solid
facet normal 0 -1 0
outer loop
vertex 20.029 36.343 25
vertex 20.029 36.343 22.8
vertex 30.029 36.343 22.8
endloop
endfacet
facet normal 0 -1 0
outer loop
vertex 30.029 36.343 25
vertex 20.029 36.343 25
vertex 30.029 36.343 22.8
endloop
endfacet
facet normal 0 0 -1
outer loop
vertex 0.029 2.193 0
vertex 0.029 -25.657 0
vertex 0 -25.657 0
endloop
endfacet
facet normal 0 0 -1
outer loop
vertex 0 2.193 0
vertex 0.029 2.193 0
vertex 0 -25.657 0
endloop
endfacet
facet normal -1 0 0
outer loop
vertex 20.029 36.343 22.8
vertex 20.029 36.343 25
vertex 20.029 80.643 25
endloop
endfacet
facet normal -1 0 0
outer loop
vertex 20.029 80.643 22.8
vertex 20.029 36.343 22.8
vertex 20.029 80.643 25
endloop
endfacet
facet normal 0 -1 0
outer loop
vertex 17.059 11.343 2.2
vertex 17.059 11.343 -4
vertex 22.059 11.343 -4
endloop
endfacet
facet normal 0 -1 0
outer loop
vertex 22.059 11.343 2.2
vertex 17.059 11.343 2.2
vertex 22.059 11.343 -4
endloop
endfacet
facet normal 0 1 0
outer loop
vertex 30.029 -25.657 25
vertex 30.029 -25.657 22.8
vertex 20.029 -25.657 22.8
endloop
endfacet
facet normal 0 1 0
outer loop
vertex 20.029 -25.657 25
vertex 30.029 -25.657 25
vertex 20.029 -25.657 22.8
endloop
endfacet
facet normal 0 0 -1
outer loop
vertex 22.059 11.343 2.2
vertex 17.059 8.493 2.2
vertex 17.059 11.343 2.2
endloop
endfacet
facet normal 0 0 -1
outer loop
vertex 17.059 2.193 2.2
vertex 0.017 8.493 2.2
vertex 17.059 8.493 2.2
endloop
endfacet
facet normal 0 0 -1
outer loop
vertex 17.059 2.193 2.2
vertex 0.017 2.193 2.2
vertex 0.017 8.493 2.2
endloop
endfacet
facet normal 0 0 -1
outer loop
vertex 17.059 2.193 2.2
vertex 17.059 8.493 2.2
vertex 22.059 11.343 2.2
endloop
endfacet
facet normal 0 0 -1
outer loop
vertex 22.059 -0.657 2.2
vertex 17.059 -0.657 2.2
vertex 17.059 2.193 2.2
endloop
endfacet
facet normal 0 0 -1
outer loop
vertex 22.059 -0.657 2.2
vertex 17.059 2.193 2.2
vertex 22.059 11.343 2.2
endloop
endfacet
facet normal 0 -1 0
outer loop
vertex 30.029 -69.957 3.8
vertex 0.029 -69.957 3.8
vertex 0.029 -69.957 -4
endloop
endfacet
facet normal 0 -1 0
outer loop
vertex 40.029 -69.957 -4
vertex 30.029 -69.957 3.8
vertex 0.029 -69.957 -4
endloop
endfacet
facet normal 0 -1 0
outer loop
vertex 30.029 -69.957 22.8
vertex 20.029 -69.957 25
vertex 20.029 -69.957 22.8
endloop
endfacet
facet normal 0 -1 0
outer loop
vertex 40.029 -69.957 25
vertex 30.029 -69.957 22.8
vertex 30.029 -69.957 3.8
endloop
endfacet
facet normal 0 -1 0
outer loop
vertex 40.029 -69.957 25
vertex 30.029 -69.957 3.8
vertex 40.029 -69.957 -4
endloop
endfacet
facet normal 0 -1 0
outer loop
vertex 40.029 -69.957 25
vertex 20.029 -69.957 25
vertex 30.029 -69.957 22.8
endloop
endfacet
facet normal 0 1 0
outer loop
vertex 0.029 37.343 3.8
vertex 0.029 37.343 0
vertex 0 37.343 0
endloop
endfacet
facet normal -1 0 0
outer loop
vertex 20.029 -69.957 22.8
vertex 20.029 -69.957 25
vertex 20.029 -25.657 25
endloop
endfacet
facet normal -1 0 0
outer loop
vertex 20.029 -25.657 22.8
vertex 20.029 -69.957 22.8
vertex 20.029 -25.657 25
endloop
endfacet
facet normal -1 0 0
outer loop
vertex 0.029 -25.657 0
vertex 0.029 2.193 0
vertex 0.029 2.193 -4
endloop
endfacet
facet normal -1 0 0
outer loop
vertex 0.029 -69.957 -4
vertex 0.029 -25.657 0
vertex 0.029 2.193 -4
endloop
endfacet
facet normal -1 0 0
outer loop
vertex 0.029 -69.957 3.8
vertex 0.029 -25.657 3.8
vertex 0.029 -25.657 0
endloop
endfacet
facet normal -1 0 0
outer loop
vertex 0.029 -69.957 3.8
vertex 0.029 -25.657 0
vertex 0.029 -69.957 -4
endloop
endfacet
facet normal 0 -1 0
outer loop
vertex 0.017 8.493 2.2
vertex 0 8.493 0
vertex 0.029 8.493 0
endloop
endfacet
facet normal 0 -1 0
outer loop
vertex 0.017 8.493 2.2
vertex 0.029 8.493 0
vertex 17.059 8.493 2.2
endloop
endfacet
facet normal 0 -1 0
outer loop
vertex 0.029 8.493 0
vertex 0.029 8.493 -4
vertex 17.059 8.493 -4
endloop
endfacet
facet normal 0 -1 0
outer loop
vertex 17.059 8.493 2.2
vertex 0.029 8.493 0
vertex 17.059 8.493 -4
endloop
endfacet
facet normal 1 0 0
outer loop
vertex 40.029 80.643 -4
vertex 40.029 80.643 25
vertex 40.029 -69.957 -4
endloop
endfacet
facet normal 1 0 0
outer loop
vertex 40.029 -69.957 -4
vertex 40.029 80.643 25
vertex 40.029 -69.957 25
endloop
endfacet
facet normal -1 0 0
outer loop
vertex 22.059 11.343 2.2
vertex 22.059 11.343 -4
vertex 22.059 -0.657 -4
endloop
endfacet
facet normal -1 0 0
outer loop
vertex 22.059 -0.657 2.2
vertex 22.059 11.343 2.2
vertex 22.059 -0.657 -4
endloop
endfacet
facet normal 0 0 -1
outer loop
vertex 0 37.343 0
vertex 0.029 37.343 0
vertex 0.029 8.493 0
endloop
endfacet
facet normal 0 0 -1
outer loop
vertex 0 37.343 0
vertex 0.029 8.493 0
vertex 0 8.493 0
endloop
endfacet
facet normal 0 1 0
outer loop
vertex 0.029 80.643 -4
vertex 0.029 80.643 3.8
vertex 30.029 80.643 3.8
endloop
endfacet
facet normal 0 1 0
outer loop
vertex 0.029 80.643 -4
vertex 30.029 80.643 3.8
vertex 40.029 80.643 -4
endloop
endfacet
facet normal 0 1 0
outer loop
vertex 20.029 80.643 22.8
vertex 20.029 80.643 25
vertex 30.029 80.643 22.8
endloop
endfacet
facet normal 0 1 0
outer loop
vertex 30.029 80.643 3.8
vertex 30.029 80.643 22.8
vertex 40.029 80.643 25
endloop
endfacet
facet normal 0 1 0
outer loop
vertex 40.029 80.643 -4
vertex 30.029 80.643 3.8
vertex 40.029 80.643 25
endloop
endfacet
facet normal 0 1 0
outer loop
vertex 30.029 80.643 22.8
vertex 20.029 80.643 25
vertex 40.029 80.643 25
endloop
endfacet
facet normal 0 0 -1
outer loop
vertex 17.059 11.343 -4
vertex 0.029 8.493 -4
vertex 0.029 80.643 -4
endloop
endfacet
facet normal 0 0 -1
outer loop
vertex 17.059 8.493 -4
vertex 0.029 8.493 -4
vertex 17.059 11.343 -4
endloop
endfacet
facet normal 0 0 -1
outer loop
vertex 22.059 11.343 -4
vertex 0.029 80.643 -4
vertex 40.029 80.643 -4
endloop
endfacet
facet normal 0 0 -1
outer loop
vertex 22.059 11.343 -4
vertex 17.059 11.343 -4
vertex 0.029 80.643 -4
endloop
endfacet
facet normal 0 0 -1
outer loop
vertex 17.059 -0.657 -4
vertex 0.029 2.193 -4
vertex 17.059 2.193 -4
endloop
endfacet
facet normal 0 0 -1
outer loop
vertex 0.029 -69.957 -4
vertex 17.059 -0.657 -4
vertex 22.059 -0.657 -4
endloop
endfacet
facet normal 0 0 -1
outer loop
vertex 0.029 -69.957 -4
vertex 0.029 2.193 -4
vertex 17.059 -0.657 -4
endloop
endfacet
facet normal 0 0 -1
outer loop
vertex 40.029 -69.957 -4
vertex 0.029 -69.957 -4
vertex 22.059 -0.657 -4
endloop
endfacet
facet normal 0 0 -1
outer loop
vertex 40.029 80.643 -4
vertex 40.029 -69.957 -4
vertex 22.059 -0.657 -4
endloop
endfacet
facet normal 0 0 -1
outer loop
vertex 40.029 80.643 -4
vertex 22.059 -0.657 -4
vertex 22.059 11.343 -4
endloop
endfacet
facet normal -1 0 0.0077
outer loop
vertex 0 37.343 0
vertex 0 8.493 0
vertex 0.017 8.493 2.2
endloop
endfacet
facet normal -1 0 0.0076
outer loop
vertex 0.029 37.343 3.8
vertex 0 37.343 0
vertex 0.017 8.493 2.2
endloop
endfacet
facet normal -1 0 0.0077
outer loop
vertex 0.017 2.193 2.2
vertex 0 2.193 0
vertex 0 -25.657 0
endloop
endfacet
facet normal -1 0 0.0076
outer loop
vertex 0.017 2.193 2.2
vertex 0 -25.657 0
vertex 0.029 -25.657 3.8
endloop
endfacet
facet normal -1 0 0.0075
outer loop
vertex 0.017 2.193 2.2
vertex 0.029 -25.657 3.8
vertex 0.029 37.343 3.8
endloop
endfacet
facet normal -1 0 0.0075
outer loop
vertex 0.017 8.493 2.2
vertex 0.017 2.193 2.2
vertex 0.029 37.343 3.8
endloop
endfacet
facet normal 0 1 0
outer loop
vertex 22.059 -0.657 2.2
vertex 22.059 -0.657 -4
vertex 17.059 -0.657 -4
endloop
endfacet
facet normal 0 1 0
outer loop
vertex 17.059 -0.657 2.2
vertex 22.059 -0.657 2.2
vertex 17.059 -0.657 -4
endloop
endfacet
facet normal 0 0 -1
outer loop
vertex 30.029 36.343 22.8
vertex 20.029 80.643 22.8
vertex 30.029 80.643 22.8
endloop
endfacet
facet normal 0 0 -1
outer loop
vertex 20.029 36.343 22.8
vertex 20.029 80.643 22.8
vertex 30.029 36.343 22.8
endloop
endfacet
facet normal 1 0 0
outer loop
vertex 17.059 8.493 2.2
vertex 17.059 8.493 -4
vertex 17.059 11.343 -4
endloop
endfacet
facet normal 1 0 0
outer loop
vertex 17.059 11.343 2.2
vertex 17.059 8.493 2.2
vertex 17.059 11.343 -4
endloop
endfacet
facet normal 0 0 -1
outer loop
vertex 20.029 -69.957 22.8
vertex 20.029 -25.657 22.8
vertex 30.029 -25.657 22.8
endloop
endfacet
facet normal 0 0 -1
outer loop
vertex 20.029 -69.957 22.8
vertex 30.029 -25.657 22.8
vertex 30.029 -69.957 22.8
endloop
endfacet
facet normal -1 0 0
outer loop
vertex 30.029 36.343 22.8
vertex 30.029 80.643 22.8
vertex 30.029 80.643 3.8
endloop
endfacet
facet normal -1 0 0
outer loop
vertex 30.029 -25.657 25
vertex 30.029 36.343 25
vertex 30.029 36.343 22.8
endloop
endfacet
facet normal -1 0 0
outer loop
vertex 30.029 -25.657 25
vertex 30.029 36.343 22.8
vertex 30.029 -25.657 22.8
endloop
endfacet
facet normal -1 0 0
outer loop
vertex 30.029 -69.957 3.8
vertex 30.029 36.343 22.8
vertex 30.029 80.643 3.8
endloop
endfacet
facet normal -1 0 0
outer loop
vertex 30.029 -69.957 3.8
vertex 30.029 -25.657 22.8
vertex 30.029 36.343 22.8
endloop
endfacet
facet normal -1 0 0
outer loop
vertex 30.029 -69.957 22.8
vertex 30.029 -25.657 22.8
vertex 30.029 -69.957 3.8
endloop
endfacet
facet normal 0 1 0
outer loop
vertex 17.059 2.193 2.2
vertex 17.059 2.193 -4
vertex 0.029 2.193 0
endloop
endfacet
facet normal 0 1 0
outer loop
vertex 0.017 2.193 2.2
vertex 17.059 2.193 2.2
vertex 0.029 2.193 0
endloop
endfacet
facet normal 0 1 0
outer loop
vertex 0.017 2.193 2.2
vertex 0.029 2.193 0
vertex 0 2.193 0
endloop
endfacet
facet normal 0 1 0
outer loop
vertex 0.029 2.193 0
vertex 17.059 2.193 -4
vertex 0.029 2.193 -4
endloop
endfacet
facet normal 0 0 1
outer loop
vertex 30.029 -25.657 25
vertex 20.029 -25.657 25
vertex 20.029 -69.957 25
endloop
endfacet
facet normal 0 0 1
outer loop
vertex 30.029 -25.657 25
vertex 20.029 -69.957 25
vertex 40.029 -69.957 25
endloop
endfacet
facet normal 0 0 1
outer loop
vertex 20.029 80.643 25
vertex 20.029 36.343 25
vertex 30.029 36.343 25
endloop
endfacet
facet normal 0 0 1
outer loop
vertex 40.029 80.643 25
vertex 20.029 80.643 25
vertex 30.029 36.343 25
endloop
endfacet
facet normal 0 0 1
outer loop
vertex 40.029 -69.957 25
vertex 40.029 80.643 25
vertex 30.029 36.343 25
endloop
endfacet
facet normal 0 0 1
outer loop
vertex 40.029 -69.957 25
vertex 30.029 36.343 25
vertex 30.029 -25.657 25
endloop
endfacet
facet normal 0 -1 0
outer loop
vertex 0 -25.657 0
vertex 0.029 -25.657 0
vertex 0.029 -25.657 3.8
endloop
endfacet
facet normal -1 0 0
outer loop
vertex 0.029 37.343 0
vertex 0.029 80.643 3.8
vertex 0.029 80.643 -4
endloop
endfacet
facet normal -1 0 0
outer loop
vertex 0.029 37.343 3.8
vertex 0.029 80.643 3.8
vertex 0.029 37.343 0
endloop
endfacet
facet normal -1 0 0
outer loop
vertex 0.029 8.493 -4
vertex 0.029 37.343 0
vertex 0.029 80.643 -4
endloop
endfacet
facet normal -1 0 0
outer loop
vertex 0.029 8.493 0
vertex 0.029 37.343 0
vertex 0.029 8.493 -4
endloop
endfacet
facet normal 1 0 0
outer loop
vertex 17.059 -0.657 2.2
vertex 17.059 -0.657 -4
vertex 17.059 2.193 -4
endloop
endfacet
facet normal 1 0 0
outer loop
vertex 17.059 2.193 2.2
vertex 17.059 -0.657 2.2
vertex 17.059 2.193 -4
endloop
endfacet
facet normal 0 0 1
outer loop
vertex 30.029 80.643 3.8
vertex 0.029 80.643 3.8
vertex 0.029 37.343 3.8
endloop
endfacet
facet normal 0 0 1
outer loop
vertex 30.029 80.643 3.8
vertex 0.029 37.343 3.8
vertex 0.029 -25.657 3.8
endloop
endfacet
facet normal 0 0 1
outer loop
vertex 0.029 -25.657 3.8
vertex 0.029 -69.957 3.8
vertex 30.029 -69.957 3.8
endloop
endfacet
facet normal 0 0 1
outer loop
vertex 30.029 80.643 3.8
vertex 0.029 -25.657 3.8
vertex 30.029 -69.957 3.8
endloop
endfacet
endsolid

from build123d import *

# Parameters (mm, degrees)
F1_DEPTH  = 25
F3_W      = 44.3
F3_H      = 19
F4_DEPTH  = 20
F5_W      = 10
F5_H      = 44.3
F6_DEPTH  = 25
F7_W      = 44.3
F7_H      = 19
F8_DEPTH  = 20
F9_W      = 10
F9_H      = 44.3
F10_DEPTH = 25
F11_W     = 44.3
F11_H     = 3.8
F12_DEPTH = 20
F13_W     = 44.3
F13_H     = 3.8
F14_DEPTH = 20
F16_DEPTH = 63
F2_W      = 40
F2_H      = 150.6
F17_DEPTH = 4
F19_DEPTH = 6.2
F20_W     = 6.3
F20_H     = 2.2
F21_DEPTH = 25


with BuildPart() as f1:
    # F0 (on Top) → F1 (new body)
    with BuildSketch(Plane.XY):
        Polygon((40.029135, -69.956624), (40.029135, 80.643376), (20.029135, 80.643376), (10.029135, 80.643376), (10.029135, 36.343376), (30.029135, 36.343376), (30.029135, -25.656624), (10.029135, -25.656624), (10.029135, -69.956624), (20.029135, -69.956624), align=None)
    extrude(amount=F1_DEPTH)

    # F3 (on face) → F4 (cut)
    with BuildSketch(Plane(origin=(10.029135, 0, 0), x_dir=(0, -1, 0), z_dir=(-1, 0, 0))):
        with Locations((-58.493376, 13.3)):
            Rectangle(F3_W, F3_H)
    extrude(amount=-F4_DEPTH, mode=Mode.SUBTRACT)

    # F5 (on face) → F6 (cut)
    with BuildSketch(Plane.XY.offset(25)):
        with Locations((15.029135, 58.493376)):
            Rectangle(F5_W, F5_H)
    extrude(amount=-F6_DEPTH, mode=Mode.SUBTRACT)

    # F7 (on face) → F8 (cut)
    with BuildSketch(Plane(origin=(10.029135, 0, 0), x_dir=(0, -1, 0), z_dir=(-1, 0, 0))):
        with Locations((47.806624, 13.3)):
            Rectangle(F7_W, F7_H)
    extrude(amount=-F8_DEPTH, mode=Mode.SUBTRACT)

    # F9 (on face) → F10 (cut)
    with BuildSketch(Plane.XY.offset(25)):
        with Locations((15.029135, -47.806624)):
            Rectangle(F9_W, F9_H)
    extrude(amount=-F10_DEPTH, mode=Mode.SUBTRACT)

    # F11 (on face) → F12 (join)
    with BuildSketch(Plane(origin=(20.029135, 0, 0), x_dir=(0, -1, 0), z_dir=(-1, 0, 0))):
        with Locations((-58.493376, 1.9)):
            Rectangle(F11_W, F11_H)
    extrude(amount=F12_DEPTH)

    # F13 (on face) → F14 (join)
    with BuildSketch(Plane(origin=(20.029135, 0, 0), x_dir=(0, -1, 0), z_dir=(-1, 0, 0))):
        with Locations((47.806624, 1.9)):
            Rectangle(F13_W, F13_H)
    extrude(amount=F14_DEPTH)

    # F15 (on face) → F16 (join)
    with BuildSketch(Plane(origin=(0, -25.656624, 0), x_dir=(-1, 0, 0), z_dir=(0, 1, 0))):
        Polygon((-0.029135, 3.8), (-30.029135, 3.8), (-30.029135, 0), (0, 0), align=None)
    extrude(amount=F16_DEPTH)

    # F2 (on face) → F17 (join)
    with BuildSketch(Plane(origin=(0, 0, 0), x_dir=(1, 0, 0), z_dir=(0, 0, -1))):
        with Locations((20.029135, -5.343376)):
            Rectangle(F2_W, F2_H)
    extrude(amount=F17_DEPTH)

    # F18 (on face) → F19 (cut)
    with BuildSketch(Plane(origin=(0, 0, -4), x_dir=(1, 0, 0), z_dir=(0, 0, -1))):
        Polygon((0.029135, -2.193376), (0.029135, -8.493376), (17.059135, -8.493376), (17.059135, -11.343376), (22.059135, -11.343376), (22.059135, 0.656624), (17.059135, 0.656624), (17.059135, -2.193376), align=None)
    extrude(amount=-F19_DEPTH, mode=Mode.SUBTRACT)

    # F20 (on face) → F21 (cut)
    with BuildSketch(Plane.YZ.offset(0.029135)):
        with Locations((5.343376, 1.1)):
            Rectangle(F20_W, F20_H)
    extrude(amount=-F21_DEPTH, mode=Mode.SUBTRACT)


solid = f1.part
